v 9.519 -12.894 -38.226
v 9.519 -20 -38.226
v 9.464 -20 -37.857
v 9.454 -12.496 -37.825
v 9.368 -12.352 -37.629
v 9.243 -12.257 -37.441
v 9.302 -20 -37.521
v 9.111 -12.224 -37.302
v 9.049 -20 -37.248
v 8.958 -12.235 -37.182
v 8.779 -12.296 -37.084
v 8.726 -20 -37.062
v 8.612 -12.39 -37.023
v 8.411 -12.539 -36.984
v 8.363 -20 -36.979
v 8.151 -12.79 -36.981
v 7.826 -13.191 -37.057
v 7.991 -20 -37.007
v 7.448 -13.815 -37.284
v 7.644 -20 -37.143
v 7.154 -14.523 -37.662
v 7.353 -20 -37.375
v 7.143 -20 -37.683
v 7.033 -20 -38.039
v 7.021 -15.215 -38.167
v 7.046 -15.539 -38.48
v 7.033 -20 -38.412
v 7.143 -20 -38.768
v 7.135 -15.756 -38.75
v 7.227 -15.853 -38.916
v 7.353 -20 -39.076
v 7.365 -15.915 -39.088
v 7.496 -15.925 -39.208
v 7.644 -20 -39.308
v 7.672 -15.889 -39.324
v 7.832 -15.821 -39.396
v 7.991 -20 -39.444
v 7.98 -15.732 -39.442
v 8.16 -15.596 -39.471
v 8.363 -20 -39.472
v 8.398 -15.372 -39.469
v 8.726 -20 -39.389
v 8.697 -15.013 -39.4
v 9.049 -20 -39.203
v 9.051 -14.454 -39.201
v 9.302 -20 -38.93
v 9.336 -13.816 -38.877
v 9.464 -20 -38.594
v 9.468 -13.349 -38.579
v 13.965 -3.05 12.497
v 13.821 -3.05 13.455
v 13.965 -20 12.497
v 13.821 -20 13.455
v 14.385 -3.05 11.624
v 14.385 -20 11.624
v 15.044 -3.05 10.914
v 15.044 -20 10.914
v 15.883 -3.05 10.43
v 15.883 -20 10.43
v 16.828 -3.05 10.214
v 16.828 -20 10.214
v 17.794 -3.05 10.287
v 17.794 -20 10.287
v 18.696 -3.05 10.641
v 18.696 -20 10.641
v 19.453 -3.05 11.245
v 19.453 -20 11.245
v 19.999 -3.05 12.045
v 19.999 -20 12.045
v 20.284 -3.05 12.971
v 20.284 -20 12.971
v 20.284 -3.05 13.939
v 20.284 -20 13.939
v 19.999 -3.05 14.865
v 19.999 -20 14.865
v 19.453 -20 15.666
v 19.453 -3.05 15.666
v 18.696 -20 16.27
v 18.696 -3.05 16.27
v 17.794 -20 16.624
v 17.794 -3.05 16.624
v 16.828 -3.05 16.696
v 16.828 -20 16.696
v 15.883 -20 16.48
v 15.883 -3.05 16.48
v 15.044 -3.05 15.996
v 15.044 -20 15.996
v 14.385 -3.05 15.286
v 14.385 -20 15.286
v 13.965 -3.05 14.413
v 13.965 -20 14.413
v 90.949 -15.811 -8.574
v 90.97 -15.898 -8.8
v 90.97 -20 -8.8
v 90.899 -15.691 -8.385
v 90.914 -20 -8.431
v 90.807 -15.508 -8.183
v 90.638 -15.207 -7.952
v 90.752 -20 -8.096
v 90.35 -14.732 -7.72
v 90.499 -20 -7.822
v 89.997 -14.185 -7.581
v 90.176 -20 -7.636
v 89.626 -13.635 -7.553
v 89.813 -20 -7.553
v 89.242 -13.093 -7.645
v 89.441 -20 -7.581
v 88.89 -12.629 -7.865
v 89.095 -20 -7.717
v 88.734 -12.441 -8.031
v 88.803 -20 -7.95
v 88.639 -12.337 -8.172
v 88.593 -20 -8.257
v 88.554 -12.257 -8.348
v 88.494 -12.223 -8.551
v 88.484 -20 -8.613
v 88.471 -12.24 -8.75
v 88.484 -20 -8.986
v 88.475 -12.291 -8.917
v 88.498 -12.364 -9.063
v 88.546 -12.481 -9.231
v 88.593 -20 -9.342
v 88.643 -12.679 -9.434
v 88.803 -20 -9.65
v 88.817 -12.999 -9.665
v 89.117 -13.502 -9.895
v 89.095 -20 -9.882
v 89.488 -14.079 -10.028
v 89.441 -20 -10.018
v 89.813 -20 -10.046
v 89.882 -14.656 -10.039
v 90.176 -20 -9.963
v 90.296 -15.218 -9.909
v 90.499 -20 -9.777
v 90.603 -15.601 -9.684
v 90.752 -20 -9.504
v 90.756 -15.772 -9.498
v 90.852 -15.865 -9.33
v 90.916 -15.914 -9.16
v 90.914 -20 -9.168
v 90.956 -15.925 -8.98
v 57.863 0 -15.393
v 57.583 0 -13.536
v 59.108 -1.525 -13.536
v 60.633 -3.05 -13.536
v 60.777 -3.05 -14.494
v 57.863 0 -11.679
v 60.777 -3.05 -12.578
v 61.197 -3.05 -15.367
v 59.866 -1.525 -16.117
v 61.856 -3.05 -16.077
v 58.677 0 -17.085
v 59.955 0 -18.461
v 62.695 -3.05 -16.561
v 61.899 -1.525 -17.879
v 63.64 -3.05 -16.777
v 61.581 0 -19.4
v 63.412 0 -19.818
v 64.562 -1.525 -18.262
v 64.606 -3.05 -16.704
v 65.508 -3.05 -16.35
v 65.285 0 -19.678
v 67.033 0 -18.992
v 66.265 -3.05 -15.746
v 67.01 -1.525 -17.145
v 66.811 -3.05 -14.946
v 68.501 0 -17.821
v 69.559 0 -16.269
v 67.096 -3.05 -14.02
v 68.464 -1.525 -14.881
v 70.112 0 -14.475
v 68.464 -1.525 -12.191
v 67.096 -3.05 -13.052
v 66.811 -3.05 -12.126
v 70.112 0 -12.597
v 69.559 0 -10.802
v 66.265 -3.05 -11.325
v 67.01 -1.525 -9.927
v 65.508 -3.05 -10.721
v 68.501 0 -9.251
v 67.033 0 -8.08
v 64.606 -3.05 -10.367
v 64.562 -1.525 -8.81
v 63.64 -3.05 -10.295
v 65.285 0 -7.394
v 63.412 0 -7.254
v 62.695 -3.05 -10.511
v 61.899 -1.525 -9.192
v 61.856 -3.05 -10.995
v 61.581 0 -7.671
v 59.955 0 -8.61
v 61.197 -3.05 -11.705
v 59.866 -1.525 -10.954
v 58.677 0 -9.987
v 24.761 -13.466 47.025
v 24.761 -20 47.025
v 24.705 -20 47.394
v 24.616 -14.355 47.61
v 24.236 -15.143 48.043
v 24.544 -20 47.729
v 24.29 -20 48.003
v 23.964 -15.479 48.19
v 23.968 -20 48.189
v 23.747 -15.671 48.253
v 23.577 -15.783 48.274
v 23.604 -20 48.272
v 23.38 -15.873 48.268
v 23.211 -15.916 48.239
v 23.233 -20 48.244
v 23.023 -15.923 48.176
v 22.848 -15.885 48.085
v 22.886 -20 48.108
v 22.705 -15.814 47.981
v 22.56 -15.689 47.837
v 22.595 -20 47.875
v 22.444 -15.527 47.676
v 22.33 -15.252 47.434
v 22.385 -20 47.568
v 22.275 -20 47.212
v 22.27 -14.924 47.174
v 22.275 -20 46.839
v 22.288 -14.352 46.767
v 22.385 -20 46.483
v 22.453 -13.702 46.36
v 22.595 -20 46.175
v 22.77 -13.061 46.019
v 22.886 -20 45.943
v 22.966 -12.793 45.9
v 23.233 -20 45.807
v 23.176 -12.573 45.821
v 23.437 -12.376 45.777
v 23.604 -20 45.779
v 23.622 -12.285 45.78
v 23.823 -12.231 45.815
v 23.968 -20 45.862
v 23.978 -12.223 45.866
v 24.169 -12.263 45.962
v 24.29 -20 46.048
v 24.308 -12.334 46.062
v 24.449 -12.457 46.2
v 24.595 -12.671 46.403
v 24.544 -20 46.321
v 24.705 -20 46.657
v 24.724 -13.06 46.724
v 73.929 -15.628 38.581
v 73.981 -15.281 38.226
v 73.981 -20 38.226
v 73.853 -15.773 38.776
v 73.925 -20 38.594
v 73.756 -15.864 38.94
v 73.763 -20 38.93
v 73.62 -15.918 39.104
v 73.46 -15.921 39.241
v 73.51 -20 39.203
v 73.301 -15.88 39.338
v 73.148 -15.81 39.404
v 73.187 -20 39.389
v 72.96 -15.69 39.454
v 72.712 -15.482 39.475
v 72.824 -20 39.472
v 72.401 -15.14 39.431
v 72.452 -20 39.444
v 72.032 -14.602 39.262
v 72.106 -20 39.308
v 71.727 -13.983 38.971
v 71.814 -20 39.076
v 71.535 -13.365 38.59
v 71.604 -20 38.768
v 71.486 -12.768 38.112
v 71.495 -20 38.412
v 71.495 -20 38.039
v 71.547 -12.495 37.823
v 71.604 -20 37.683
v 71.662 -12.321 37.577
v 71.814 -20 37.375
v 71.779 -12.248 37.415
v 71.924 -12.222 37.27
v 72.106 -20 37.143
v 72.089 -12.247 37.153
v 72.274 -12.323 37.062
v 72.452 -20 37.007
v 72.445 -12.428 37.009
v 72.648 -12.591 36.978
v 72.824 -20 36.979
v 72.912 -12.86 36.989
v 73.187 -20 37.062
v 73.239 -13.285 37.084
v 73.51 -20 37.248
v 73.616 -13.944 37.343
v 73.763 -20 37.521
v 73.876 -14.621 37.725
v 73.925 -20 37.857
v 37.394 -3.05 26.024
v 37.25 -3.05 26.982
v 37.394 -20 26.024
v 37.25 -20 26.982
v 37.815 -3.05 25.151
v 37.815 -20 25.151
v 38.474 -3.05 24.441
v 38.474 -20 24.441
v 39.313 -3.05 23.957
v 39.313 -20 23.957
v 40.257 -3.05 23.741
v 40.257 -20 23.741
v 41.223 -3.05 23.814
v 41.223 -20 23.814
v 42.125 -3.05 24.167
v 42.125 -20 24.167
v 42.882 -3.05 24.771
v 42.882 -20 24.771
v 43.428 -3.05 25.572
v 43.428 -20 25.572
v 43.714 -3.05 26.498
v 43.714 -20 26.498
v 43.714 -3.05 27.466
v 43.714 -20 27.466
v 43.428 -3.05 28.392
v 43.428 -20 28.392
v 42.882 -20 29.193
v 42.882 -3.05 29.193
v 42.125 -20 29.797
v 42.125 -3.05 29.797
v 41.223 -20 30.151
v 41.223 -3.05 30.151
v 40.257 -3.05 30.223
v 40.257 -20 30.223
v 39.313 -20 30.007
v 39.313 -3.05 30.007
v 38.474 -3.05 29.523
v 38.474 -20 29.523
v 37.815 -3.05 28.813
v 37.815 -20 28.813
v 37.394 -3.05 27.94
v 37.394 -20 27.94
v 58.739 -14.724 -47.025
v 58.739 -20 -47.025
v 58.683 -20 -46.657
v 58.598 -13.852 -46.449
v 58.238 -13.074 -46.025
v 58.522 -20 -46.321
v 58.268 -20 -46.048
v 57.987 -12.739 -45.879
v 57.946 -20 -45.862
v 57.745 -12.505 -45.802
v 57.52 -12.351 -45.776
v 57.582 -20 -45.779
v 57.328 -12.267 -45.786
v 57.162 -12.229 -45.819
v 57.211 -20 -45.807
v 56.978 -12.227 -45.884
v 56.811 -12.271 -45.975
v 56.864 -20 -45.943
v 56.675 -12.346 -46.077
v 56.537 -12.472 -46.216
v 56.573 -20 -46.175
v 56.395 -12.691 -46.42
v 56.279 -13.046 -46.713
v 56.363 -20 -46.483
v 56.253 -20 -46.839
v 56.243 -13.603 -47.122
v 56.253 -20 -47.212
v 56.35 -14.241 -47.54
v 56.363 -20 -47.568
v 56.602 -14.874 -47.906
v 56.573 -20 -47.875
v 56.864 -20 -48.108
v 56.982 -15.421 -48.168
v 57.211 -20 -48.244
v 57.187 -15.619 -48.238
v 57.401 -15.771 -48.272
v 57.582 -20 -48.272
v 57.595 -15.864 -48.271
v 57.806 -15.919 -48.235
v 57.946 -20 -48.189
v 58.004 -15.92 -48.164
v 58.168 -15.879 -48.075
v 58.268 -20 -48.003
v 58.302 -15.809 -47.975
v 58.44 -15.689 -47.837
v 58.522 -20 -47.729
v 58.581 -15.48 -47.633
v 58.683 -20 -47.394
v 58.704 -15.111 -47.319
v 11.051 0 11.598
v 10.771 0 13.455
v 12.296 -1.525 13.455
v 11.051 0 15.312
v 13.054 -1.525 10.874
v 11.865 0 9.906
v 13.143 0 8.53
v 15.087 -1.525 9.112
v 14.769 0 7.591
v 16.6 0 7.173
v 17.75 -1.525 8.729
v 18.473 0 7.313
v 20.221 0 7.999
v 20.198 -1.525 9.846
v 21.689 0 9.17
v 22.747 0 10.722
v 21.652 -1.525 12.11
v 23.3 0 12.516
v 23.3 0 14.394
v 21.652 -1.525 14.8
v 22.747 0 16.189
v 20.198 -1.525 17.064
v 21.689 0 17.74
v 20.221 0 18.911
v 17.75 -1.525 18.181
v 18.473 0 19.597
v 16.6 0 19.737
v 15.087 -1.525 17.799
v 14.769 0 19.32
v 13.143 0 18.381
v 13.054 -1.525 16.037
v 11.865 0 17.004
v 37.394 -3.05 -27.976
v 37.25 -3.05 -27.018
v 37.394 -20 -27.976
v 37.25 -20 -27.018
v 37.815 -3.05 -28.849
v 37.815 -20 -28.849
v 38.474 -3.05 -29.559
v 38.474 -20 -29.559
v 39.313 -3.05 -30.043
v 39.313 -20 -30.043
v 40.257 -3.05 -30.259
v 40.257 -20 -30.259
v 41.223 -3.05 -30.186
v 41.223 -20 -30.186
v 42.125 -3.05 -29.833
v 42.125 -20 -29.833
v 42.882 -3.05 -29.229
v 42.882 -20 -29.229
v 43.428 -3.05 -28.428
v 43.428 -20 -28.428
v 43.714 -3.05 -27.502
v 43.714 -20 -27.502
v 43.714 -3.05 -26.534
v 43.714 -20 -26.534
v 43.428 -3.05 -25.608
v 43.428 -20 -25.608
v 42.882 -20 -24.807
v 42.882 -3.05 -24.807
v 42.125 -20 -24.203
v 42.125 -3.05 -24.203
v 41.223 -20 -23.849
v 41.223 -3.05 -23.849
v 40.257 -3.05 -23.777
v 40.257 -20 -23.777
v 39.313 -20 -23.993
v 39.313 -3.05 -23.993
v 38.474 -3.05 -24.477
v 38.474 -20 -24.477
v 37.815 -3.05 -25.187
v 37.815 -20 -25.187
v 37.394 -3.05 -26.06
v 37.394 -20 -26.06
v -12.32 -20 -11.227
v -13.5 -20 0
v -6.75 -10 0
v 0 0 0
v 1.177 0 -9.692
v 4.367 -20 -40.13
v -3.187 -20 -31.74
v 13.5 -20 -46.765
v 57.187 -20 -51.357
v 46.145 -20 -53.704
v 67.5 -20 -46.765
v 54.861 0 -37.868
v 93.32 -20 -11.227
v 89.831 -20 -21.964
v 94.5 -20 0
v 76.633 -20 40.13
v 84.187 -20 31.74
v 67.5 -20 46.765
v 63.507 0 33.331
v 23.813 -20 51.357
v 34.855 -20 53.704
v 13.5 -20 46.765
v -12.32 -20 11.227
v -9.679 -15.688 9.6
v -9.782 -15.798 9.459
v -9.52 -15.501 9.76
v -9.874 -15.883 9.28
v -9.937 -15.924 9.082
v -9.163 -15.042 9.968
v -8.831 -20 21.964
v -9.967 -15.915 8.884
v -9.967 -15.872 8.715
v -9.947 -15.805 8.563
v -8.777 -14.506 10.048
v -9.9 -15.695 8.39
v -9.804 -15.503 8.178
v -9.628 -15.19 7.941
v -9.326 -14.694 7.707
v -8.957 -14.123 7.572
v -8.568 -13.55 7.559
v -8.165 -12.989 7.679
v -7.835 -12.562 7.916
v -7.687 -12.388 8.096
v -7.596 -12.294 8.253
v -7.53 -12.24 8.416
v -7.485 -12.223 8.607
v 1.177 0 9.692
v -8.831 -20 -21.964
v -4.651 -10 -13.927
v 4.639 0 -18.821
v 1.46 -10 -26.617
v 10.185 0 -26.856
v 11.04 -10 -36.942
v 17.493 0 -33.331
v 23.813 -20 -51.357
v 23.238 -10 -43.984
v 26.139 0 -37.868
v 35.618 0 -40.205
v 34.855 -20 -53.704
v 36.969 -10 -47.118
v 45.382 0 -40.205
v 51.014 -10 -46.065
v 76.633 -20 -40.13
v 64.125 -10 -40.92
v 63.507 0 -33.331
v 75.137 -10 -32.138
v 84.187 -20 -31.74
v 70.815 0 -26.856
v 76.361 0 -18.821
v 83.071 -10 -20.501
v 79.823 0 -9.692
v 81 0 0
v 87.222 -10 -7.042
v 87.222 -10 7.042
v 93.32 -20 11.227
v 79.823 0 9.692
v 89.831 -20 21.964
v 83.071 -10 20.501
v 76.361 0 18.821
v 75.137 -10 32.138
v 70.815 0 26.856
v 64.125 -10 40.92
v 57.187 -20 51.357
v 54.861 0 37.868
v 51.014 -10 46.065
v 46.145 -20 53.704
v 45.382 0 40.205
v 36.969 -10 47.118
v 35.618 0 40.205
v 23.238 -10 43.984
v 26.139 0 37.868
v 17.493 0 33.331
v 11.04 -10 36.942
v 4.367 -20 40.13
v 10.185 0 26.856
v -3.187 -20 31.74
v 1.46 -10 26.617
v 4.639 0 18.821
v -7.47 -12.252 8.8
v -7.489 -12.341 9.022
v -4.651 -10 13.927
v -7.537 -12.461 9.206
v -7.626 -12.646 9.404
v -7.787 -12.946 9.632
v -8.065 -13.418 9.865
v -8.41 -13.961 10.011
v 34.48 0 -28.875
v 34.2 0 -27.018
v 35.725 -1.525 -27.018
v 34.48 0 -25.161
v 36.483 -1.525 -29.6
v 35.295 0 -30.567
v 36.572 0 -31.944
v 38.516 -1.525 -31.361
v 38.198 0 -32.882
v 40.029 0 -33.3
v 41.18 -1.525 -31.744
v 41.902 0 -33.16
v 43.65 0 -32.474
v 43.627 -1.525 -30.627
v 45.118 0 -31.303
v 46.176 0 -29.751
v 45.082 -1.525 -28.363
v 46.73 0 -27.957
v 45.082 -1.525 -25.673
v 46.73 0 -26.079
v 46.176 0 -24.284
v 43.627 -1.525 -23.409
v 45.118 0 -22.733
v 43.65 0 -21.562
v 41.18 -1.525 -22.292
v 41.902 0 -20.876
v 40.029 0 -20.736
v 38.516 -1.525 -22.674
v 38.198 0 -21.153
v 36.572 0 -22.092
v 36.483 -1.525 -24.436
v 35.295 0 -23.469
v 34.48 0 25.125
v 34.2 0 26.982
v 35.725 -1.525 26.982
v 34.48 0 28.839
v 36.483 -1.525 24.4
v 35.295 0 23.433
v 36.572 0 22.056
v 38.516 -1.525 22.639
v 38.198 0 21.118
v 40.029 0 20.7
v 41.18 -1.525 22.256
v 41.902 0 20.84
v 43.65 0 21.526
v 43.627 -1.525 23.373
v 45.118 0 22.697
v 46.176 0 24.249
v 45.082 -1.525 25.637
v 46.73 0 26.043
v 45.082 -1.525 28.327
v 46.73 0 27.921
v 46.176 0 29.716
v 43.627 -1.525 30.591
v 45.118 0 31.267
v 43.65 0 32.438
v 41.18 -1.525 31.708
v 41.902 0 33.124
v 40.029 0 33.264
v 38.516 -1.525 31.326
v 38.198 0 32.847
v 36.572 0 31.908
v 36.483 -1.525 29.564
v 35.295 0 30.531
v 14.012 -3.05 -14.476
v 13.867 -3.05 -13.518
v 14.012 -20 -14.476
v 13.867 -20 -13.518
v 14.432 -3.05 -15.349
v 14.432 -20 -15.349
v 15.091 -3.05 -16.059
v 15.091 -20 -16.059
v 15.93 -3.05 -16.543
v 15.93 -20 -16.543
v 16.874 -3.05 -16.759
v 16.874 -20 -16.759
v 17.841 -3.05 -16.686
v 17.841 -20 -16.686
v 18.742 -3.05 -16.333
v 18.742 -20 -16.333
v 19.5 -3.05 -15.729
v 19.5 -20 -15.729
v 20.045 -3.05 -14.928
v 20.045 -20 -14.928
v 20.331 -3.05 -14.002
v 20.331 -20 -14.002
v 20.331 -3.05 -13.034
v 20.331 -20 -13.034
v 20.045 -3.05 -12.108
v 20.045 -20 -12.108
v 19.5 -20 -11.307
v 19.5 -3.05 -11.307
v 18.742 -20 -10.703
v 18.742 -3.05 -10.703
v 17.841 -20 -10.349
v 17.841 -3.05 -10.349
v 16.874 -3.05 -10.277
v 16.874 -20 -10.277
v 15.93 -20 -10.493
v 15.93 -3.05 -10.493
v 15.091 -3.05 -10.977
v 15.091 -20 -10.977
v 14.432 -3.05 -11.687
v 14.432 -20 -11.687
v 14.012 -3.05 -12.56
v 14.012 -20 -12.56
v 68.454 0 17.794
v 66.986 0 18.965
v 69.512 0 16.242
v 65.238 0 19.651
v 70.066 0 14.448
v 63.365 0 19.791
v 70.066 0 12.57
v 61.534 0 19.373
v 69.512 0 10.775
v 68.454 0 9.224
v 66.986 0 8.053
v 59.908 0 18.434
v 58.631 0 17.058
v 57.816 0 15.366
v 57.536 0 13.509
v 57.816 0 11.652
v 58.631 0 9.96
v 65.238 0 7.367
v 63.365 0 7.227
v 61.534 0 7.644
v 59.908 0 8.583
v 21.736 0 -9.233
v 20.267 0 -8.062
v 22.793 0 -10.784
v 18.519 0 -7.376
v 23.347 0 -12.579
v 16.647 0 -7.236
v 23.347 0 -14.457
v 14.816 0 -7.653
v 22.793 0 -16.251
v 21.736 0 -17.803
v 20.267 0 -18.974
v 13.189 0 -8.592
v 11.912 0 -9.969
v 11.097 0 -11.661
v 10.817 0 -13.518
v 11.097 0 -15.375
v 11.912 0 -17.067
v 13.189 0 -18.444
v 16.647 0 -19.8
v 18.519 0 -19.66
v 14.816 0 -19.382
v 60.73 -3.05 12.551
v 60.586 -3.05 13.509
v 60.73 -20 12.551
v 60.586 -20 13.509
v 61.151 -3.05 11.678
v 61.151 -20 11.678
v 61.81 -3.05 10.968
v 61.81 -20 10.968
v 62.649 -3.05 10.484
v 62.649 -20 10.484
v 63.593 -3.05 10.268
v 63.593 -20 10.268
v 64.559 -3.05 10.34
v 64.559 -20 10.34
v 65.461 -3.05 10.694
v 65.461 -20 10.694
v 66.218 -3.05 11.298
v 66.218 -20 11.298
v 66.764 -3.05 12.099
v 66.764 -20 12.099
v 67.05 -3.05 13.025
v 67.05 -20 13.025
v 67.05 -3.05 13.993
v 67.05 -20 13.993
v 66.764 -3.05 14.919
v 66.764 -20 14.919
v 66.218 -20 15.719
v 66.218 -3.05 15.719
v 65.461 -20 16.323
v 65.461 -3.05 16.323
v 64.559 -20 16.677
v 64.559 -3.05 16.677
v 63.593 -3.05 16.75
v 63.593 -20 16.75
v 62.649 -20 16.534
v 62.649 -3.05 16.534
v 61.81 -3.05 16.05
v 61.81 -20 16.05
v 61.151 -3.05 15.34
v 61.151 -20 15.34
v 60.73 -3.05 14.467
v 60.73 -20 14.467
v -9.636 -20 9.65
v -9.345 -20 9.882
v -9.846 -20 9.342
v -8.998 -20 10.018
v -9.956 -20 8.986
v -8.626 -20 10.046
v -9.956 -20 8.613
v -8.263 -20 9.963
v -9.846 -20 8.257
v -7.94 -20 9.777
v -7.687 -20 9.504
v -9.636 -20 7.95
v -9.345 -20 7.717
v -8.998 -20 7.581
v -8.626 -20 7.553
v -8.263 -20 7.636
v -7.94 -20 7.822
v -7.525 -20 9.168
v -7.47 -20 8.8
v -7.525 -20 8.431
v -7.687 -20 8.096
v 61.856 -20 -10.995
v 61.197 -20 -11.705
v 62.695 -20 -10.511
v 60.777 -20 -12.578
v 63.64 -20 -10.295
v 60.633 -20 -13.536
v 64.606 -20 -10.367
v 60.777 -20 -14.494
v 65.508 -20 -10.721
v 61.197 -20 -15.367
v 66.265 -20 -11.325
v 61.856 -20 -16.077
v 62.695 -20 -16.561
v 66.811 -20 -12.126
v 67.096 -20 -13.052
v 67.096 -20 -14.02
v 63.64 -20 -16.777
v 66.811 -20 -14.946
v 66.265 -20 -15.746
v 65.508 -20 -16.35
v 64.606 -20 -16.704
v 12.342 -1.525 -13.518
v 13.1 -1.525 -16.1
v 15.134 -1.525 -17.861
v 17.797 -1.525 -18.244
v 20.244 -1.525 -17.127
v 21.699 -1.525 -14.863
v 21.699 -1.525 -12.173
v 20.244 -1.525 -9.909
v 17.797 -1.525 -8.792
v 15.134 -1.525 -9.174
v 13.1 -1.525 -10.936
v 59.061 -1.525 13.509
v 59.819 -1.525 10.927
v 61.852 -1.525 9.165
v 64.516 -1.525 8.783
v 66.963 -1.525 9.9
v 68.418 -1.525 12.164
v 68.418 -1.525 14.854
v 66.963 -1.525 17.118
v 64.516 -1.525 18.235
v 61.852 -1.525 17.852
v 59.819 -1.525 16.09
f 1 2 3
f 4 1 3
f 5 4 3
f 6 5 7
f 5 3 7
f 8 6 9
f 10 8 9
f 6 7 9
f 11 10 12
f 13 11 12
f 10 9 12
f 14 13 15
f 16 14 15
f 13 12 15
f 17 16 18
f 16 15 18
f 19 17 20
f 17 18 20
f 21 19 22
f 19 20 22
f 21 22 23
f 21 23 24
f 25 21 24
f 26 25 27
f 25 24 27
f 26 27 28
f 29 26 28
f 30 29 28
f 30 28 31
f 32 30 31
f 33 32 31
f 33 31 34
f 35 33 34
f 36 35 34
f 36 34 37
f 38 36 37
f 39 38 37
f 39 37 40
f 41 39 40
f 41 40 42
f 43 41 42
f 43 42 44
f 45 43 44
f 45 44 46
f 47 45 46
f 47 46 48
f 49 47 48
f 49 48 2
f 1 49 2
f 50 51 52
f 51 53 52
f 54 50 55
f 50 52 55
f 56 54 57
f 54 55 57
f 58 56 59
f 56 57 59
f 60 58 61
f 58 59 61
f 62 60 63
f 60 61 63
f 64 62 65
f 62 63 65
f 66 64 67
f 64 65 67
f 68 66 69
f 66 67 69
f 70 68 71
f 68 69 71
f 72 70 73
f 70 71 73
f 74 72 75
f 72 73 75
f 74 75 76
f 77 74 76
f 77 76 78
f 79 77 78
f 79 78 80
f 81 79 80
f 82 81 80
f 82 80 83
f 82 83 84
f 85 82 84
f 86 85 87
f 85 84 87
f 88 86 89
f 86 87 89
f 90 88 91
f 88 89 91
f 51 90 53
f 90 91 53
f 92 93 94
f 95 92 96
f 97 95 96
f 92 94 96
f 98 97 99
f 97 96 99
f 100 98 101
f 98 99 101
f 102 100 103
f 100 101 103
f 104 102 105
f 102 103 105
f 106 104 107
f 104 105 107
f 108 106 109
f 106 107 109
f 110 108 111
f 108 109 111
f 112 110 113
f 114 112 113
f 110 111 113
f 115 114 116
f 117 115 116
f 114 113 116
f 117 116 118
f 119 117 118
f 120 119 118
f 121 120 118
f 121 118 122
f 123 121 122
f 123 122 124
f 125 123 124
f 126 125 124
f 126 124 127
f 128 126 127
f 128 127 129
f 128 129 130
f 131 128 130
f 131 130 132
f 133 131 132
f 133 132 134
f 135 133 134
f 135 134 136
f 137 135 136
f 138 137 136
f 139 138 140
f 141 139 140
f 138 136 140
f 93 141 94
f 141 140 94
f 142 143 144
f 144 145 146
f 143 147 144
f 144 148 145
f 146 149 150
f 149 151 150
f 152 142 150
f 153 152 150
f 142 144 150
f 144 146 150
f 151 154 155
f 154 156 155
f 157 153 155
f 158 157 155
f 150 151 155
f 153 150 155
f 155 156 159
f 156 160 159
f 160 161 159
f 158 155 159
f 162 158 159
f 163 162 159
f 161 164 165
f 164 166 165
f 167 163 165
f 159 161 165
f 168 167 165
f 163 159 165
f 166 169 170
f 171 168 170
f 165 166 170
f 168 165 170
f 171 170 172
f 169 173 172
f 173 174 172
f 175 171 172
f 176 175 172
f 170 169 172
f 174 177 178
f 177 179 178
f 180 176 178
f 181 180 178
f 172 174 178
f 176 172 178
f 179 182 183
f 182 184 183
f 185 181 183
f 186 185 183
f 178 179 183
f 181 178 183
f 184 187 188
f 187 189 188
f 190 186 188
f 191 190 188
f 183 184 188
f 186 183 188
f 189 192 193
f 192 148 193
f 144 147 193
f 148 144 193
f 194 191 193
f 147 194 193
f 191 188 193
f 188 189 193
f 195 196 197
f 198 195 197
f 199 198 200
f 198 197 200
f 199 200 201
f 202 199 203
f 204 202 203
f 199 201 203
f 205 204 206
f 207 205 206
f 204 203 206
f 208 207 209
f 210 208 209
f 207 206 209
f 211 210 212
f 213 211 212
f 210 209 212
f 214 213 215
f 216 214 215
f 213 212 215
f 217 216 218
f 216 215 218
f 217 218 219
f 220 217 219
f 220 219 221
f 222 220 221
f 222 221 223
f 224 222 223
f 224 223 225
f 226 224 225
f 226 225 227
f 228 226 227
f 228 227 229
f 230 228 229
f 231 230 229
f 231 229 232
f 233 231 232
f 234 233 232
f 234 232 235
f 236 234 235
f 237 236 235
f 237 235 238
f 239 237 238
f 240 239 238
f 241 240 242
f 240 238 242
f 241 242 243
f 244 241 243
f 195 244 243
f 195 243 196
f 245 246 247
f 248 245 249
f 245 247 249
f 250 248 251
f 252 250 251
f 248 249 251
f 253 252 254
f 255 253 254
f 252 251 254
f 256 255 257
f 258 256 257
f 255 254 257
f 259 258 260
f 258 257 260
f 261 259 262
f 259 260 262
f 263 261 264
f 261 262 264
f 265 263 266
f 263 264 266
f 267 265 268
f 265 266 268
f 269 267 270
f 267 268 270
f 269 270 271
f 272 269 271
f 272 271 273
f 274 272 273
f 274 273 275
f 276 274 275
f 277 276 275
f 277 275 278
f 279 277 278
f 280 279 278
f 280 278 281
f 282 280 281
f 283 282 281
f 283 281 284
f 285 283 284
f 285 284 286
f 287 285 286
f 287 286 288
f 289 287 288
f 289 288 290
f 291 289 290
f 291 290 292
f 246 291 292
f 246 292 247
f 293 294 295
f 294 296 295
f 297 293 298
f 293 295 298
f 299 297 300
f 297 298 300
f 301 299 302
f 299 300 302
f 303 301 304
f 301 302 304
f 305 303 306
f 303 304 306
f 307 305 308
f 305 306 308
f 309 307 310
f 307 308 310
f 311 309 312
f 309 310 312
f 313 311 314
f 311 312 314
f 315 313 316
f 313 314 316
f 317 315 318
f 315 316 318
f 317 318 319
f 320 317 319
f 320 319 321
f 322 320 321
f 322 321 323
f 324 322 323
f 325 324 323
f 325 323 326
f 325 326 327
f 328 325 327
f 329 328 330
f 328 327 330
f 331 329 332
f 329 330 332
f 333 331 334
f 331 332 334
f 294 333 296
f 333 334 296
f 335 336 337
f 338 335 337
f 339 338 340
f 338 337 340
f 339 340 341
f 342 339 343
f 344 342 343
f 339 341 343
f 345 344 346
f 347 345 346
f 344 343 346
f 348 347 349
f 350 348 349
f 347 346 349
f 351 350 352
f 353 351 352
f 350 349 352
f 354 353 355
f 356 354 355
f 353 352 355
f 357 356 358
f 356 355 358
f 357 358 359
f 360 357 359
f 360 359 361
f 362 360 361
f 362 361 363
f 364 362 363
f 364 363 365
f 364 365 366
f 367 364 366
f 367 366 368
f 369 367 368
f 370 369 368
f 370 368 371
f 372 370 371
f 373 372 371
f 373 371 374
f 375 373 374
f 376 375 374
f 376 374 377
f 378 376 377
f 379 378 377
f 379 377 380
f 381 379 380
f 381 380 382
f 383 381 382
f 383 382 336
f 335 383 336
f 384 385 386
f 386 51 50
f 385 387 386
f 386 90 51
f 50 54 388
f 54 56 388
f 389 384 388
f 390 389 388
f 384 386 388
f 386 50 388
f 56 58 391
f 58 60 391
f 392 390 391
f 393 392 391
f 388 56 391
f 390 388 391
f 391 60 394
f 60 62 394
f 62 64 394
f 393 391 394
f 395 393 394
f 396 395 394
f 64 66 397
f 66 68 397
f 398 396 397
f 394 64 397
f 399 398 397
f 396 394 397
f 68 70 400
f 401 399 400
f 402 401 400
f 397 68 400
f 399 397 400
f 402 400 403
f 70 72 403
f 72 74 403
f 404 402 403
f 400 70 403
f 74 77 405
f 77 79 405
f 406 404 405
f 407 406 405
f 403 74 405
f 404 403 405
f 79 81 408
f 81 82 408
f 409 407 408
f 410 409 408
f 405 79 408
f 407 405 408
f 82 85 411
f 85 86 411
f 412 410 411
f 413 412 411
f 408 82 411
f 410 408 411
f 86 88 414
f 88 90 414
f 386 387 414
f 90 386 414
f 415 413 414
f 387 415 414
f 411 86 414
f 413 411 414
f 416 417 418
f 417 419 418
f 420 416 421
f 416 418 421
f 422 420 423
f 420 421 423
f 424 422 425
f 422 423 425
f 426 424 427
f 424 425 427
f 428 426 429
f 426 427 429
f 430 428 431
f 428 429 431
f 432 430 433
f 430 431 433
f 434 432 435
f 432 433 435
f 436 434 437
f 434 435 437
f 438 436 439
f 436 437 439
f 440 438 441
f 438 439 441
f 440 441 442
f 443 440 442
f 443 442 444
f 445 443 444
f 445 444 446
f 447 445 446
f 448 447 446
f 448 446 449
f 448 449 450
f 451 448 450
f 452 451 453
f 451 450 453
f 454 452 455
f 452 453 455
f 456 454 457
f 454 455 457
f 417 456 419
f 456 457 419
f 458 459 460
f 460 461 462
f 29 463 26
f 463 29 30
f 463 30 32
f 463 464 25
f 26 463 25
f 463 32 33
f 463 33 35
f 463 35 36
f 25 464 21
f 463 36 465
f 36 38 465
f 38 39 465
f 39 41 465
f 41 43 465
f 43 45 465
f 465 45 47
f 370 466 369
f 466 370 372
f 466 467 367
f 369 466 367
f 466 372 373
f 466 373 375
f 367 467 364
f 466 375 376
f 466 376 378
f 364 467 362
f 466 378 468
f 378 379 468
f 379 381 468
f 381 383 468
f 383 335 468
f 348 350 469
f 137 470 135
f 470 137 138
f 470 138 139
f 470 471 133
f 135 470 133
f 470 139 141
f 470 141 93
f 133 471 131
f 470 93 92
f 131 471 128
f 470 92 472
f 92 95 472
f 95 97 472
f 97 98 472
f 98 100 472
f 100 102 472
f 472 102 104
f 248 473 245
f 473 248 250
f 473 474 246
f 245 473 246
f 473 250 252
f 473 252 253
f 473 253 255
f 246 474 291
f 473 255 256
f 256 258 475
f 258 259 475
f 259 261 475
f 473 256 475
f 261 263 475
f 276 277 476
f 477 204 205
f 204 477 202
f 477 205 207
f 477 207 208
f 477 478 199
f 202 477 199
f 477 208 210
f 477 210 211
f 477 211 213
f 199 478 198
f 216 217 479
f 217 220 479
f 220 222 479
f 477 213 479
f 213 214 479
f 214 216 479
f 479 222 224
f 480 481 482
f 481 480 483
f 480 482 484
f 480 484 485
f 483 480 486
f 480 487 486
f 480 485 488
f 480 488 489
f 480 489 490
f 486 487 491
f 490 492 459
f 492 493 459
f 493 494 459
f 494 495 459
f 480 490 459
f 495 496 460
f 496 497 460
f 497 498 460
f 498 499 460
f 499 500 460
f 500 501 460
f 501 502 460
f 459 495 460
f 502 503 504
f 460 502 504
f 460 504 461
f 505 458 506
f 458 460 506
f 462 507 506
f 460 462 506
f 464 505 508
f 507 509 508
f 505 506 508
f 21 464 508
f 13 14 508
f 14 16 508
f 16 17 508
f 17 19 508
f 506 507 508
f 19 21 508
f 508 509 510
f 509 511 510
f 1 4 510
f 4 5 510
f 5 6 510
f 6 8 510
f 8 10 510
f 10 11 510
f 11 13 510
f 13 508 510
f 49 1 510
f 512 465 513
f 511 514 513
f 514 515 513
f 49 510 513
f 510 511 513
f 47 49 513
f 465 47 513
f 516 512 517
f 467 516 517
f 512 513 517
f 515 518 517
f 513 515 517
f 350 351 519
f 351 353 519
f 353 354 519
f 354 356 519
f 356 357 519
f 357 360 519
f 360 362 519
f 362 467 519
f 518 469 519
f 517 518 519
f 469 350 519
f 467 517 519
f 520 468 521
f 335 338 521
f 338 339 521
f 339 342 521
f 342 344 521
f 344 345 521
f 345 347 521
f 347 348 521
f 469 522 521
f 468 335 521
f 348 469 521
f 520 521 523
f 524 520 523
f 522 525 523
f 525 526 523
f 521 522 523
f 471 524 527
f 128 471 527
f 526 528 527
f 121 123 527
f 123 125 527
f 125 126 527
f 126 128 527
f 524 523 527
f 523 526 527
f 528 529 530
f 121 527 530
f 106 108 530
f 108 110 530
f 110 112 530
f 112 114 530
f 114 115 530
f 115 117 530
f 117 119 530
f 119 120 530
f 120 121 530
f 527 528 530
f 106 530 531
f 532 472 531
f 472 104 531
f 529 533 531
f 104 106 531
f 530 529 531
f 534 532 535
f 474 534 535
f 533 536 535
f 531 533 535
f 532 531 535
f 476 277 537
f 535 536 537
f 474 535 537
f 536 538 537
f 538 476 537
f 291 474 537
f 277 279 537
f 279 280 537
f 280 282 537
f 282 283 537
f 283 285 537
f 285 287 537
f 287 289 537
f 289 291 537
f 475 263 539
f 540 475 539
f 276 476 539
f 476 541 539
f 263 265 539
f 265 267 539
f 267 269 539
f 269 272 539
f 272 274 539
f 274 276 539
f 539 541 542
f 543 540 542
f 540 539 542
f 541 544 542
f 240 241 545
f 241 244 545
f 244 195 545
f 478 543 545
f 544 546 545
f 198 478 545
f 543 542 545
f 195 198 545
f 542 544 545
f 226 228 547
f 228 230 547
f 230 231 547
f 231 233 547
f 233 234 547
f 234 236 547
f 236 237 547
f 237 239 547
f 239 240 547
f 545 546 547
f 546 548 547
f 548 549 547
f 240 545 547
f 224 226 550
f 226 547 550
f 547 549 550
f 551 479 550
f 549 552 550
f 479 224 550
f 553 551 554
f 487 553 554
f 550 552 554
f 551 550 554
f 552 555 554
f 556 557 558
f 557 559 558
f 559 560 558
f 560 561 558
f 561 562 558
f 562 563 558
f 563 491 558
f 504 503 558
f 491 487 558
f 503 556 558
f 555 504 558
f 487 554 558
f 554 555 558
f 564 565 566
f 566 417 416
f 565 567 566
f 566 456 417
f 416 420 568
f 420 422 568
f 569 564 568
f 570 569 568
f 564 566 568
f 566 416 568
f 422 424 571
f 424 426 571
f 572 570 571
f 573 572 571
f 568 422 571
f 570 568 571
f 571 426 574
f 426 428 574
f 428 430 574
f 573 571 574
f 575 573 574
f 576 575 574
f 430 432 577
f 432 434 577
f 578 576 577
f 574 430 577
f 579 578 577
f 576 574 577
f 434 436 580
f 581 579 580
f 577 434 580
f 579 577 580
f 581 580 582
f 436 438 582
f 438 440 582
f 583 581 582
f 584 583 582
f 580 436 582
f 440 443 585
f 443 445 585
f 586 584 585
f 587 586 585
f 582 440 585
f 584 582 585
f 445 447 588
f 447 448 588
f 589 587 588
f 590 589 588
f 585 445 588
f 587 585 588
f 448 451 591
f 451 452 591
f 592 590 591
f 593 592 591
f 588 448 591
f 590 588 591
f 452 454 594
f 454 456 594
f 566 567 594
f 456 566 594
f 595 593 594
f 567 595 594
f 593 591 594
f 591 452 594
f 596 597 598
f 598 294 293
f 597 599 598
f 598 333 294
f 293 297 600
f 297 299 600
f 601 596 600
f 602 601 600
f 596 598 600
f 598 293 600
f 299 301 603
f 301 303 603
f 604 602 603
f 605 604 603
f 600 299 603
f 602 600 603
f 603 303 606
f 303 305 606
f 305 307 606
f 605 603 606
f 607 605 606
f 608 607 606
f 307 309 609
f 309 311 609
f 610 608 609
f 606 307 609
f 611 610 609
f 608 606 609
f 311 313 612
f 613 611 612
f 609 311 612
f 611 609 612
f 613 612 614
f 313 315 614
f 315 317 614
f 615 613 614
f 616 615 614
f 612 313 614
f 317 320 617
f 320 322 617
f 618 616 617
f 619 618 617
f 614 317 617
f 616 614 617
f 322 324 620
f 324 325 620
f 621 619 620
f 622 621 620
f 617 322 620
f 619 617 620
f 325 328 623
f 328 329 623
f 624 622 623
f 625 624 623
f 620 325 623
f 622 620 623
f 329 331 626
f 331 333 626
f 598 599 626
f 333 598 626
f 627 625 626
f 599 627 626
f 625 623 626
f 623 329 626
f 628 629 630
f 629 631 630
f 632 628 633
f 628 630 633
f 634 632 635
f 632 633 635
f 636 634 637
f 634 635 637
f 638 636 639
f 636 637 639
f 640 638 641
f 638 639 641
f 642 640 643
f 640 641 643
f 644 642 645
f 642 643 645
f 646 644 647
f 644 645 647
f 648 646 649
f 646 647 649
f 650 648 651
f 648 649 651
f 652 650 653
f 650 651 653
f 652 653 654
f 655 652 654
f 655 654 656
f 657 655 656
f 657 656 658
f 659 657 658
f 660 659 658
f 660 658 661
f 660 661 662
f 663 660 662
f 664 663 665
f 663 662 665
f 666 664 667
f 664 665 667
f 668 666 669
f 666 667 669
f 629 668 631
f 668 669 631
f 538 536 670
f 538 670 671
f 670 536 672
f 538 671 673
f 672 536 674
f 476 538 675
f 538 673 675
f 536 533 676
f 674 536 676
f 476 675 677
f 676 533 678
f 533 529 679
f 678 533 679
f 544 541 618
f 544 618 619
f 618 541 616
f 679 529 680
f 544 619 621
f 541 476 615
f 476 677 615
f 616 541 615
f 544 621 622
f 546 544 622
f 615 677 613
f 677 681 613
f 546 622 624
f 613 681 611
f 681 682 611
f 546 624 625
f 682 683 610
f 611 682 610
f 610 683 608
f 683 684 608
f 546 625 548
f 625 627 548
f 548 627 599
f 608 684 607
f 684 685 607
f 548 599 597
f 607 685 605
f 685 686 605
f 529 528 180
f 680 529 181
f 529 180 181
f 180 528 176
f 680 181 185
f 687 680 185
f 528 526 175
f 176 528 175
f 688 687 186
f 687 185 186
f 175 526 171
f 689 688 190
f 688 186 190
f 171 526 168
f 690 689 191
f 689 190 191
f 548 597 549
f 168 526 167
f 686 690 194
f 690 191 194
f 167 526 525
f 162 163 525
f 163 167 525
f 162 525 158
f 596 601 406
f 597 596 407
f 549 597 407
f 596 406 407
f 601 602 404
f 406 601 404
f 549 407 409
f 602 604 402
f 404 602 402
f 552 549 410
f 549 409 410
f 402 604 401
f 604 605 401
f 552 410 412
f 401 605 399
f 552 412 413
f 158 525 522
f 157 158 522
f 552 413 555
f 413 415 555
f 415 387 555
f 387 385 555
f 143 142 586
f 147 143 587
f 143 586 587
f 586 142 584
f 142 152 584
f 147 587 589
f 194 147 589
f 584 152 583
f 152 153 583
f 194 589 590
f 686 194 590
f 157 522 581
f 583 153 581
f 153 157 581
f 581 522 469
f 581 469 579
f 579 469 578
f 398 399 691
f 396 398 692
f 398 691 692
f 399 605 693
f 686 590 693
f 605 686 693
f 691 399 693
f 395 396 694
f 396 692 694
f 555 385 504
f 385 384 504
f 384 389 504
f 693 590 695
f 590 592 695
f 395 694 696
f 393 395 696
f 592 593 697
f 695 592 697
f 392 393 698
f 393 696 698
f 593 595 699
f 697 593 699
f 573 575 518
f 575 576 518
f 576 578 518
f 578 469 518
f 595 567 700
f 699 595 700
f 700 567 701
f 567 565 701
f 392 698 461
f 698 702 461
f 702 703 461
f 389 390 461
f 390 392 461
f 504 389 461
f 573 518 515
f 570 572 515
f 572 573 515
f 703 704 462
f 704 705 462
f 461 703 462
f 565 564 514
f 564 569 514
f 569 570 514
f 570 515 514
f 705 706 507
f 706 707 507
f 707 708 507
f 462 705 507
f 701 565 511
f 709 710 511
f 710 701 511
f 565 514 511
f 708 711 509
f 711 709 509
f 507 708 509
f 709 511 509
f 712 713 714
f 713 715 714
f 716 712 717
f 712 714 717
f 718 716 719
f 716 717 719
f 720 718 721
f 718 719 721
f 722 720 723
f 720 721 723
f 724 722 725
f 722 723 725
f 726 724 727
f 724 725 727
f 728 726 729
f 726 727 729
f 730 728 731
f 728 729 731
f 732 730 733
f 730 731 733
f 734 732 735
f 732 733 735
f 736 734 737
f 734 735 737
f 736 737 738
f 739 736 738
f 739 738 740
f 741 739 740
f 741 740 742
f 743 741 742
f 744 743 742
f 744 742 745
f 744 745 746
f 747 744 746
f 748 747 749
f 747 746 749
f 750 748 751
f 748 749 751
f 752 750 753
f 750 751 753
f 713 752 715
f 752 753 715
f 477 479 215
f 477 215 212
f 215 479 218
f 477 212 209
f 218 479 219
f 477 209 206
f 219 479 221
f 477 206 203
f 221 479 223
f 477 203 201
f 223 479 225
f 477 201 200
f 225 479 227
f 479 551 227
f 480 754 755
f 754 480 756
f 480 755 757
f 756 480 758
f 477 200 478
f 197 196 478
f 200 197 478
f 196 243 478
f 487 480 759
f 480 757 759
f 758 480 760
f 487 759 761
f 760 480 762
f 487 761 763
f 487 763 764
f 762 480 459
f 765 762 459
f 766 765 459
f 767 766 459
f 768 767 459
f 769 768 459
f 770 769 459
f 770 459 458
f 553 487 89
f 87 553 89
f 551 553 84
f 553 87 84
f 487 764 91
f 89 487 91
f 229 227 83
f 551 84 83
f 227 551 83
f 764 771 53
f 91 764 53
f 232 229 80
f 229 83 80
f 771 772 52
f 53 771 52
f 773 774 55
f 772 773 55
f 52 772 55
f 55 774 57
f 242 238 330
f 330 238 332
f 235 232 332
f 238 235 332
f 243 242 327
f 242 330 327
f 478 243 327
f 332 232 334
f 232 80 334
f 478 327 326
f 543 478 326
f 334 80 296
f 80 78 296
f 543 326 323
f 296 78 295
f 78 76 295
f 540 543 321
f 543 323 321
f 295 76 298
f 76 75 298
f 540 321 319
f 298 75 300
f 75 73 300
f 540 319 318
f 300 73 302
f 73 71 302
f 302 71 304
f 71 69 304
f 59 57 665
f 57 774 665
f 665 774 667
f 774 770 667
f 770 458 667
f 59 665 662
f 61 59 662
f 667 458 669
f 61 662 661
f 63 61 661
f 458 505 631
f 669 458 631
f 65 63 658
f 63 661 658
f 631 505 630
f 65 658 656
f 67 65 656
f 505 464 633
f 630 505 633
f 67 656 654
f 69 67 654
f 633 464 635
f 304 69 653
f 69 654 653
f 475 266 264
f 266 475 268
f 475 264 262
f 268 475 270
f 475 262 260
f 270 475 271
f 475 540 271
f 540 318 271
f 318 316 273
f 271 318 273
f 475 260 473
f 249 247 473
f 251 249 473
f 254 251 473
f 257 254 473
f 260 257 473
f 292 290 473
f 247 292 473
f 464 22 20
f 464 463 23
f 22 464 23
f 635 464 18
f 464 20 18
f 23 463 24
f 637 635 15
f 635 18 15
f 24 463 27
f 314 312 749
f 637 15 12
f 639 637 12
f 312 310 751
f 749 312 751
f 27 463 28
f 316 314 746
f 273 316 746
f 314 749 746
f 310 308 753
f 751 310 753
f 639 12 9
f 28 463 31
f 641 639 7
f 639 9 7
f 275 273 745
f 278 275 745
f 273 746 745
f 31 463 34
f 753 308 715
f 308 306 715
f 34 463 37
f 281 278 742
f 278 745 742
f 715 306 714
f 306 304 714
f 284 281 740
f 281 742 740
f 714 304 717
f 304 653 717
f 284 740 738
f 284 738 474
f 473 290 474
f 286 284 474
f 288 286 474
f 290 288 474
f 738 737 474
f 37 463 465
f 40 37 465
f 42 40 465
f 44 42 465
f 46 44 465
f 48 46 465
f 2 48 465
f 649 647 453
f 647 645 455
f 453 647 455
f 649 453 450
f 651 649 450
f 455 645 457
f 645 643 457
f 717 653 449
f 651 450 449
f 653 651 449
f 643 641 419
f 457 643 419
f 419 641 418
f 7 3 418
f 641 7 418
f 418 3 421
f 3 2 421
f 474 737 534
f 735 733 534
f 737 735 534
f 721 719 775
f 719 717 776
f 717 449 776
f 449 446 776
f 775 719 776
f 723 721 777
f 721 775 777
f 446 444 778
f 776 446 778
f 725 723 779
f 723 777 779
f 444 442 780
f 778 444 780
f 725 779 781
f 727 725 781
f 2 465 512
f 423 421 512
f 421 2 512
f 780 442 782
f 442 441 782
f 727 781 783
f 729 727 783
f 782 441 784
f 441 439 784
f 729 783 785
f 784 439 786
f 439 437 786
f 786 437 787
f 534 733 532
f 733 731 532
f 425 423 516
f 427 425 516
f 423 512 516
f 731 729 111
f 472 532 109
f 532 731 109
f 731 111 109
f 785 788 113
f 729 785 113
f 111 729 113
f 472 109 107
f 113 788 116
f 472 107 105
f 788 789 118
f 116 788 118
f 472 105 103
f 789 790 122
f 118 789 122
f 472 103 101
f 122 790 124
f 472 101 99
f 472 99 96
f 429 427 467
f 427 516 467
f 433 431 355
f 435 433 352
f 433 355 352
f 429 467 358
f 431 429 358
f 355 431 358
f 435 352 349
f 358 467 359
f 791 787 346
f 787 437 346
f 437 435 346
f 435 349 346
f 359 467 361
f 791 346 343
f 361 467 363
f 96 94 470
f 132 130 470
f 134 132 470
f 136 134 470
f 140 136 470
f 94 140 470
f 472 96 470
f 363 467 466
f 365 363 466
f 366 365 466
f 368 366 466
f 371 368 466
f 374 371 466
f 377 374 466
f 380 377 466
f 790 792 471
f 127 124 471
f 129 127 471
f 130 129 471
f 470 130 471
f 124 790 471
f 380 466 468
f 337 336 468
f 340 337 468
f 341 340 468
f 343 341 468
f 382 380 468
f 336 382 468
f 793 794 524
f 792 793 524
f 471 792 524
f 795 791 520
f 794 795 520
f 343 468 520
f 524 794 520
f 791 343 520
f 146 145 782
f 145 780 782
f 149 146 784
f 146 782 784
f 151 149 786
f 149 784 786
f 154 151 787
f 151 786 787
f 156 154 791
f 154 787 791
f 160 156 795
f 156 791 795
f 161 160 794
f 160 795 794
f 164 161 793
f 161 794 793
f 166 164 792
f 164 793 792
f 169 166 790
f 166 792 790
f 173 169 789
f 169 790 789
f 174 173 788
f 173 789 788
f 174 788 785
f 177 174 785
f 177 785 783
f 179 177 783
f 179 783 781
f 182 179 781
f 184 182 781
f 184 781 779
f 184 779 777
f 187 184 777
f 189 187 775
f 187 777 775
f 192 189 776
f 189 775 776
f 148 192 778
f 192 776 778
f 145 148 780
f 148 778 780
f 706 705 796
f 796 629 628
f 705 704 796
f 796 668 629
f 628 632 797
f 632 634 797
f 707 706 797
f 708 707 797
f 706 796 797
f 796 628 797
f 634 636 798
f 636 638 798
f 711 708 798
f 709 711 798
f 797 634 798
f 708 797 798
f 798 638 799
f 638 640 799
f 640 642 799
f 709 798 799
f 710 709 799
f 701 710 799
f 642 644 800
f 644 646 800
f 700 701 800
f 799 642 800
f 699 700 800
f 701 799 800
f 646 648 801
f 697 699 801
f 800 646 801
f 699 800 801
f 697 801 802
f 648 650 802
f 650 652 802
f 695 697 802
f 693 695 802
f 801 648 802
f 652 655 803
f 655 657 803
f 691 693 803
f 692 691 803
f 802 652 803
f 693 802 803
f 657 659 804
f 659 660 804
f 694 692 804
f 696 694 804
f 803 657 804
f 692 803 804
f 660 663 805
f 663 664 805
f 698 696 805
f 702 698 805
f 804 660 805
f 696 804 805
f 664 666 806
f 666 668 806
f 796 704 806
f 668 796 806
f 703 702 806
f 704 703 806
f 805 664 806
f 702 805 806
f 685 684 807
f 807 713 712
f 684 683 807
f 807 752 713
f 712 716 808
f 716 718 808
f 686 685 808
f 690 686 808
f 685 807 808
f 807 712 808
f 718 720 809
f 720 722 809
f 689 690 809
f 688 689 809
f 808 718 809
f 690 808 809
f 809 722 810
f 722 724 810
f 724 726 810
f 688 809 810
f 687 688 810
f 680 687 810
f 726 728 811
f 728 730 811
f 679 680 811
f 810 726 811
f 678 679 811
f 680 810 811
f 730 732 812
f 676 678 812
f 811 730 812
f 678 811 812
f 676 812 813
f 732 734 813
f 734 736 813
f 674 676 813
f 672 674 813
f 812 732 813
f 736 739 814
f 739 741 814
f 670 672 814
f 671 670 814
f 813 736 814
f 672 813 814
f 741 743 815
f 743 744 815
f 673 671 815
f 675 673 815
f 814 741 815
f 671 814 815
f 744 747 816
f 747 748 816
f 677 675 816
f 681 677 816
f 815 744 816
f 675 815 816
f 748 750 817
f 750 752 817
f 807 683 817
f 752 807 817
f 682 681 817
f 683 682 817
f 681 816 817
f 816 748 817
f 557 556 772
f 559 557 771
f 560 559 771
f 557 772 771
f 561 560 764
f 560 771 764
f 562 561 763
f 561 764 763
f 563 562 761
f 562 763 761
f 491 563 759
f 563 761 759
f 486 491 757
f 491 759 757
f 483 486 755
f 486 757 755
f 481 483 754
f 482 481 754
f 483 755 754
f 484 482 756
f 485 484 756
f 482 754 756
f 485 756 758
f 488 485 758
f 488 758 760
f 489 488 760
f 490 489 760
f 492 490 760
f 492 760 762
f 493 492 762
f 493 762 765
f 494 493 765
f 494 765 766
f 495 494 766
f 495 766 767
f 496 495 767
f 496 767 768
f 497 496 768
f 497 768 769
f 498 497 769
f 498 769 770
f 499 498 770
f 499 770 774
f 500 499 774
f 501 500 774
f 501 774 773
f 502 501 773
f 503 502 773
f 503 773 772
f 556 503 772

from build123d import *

# Parameters (mm, degrees)
CSK_FOR_ST6_3_CROSS_RECESSED_CTSK_HEAD_T_D           = 6.5
CSK_FOR_ST6_3_CROSS_RECESSED_CTSK_HEAD_T_CSINK_D     = 12.6
CSK_FOR_ST6_3_CROSS_RECESSED_CTSK_HEAD_T_CSINK_ANGLE = 90
CSK_FOR_ST6_3_CROSS_RECESSED_CTSK_HE_2_D             = 6.5
CSK_FOR_ST6_3_CROSS_RECESSED_CTSK_HE_2_CSINK_D       = 12.6
CSK_FOR_ST6_3_CROSS_RECESSED_CTSK_HE_2_CSINK_ANGLE   = 90
SKETCH9_R                                            = 1.25
CUT_EXTRUDE1_DEPTH                                   = 50
SKETCH9_3_R                                          = 1.25
CUT_EXTRUDE2_DEPTH                                   = 50
SKETCH9_4_R                                          = 1.25
CUT_EXTRUDE3_DEPTH                                   = 50
SKETCH9_5_R                                          = 1.25
CUT_EXTRUDE4_DEPTH                                   = 50
SKETCH9_7_R                                          = 1.25
CUT_EXTRUDE5_DEPTH                                   = 50
SKETCH9_8_R                                          = 1.25
CUT_EXTRUDE6_DEPTH                                   = 50


with BuildPart() as part:
    # Sketch1 → Revolve1 (revolve)
    with BuildSketch(Plane.XY):
        Polygon((0, 0), (40.5, 0), (40.5, -20), (-13.5, -20), align=None)
    revolve(axis=Axis((40.5, 11.538552748, 0), (0, -1, 0)))

    # CSK for ST6.3 Cross recessed CTSK head t (through all)
    with Locations(Plane(origin=(0, 0, 0), x_dir=(1, 0, 0), z_dir=(0, 1, 0))):
        with Locations((17.07072808, -13.455101055), (63.836068925, -13.508911829), (40.5, 27.017966747)):
            CounterSinkHole(CSK_FOR_ST6_3_CROSS_RECESSED_CTSK_HEAD_T_D / 2, CSK_FOR_ST6_3_CROSS_RECESSED_CTSK_HEAD_T_CSINK_D / 2, counter_sink_angle=CSK_FOR_ST6_3_CROSS_RECESSED_CTSK_HEAD_T_CSINK_ANGLE)

    # CSK for ST6.3 Cross recessed CTSK he 2 (through all)
    with Locations(Plane(origin=(0, 0, 0), x_dir=(1, 0, 0), z_dir=(0, 1, 0))):
        with Locations((17.117314098, 13.517966747), (63.882685902, 13.535897721), (40.5, -26.982033253)):
            CounterSinkHole(CSK_FOR_ST6_3_CROSS_RECESSED_CTSK_HE_2_D / 2, CSK_FOR_ST6_3_CROSS_RECESSED_CTSK_HE_2_CSINK_D / 2, counter_sink_angle=CSK_FOR_ST6_3_CROSS_RECESSED_CTSK_HE_2_CSINK_ANGLE)

    # Sketch9 → Cut-Extrude1 (cut)
    with BuildSketch(Plane.XZ.offset(20)):
        with Locations((89.719555543, -8.799735913)):
            Circle(SKETCH9_R)
    extrude(amount=-CUT_EXTRUDE1_DEPTH, mode=Mode.SUBTRACT)

    # Sketch9<3> → Cut-Extrude2 (cut)
    with BuildSketch(Plane.XZ.offset(20)):
        with Locations((72.730572619, 38.225517507)):
            Circle(SKETCH9_3_R)
    extrude(amount=-CUT_EXTRUDE2_DEPTH, mode=Mode.SUBTRACT)

    # Sketch9<4> → Cut-Extrude3 (cut)
    with BuildSketch(Plane.XZ.offset(20)):
        with Locations((23.511017076, 47.02525342)):
            Circle(SKETCH9_4_R)
    extrude(amount=-CUT_EXTRUDE3_DEPTH, mode=Mode.SUBTRACT)

    # Sketch9<5> → Cut-Extrude4 (cut)
    with BuildSketch(Plane.XZ.offset(20)):
        with Locations((-8.719555543, 8.799735913)):
            Circle(SKETCH9_5_R)
    extrude(amount=-CUT_EXTRUDE4_DEPTH, mode=Mode.SUBTRACT)

    # Sketch9<7> → Cut-Extrude5 (cut)
    with BuildSketch(Plane.XZ.offset(20)):
        with Locations((8.269427381, -38.225517507)):
            Circle(SKETCH9_7_R)
    extrude(amount=-CUT_EXTRUDE5_DEPTH, mode=Mode.SUBTRACT)

    # Sketch9<8> → Cut-Extrude6 (cut)
    with BuildSketch(Plane.XZ.offset(20)):
        with Locations((57.488982924, -47.02525342)):
            Circle(SKETCH9_8_R)
    extrude(amount=-CUT_EXTRUDE6_DEPTH, mode=Mode.SUBTRACT)


solid = part.part
